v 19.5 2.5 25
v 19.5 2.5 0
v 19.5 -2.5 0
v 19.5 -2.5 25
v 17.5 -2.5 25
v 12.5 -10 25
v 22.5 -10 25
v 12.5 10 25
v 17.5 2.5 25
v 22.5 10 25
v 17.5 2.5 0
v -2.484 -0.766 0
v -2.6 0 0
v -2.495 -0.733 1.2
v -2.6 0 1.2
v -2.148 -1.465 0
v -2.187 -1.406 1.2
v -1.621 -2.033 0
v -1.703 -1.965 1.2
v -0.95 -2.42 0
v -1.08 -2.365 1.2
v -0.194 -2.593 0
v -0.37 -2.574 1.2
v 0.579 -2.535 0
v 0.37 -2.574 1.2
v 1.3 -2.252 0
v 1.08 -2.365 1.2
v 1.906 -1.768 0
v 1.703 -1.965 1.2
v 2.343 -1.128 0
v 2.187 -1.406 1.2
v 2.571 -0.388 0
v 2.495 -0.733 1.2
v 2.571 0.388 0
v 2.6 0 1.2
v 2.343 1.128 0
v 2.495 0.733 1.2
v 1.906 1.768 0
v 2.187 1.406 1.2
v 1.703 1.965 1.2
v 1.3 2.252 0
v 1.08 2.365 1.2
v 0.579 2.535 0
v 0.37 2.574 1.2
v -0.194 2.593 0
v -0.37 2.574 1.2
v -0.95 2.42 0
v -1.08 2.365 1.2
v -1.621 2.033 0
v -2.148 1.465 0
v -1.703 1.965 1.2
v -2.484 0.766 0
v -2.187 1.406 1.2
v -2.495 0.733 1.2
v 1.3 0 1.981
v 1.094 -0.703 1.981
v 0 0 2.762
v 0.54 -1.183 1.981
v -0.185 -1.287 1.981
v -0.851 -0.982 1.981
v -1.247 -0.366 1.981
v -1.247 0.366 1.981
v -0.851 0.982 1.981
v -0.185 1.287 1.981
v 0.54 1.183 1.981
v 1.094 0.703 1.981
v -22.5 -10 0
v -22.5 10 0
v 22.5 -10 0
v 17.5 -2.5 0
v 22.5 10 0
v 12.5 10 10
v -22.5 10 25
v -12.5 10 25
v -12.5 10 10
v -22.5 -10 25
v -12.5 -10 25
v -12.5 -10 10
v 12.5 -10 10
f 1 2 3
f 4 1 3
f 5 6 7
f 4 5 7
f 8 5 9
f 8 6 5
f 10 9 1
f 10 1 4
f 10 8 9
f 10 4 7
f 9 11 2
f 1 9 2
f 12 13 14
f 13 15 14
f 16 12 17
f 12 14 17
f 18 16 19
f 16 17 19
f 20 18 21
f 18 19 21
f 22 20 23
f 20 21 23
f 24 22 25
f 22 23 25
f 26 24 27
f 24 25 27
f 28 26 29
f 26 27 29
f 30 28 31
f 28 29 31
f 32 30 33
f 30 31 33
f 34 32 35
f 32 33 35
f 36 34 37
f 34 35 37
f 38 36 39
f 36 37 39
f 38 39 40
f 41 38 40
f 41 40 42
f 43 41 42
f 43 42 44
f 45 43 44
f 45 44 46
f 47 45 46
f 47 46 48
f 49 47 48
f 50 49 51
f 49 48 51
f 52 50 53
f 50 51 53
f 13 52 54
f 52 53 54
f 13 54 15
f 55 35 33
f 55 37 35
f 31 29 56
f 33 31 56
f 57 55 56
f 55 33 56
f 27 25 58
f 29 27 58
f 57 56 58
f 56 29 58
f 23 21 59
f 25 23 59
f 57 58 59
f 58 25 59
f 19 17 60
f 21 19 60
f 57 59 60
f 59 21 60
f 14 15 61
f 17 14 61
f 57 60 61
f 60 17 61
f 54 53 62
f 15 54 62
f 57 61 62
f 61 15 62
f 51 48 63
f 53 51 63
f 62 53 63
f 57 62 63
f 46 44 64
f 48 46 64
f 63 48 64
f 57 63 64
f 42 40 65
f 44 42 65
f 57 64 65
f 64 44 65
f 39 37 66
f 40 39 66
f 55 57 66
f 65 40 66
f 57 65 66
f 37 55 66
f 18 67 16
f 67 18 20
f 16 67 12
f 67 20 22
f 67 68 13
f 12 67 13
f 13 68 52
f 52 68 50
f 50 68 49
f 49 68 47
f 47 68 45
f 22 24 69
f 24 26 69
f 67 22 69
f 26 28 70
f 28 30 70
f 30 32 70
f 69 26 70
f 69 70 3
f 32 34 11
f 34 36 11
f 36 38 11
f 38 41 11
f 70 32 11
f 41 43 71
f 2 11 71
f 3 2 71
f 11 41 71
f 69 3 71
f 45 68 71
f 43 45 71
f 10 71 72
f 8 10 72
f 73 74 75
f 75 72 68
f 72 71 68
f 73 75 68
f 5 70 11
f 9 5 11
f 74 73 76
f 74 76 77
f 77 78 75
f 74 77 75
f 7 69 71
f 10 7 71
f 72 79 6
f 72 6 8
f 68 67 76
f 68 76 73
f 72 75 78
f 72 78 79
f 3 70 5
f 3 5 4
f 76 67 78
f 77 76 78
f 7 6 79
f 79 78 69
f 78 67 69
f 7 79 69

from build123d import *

# Parameters (mm, degrees)
F0_W     = 25
F0_H     = 20
F0_W_2   = 10
F1_DEPTH = 10
F2_DEPTH = 25
F4_D     = 5.2
F4_DEPTH = 1.2
F4_TIP   = 1.5622376095
F3_W     = 2
F3_H     = 2.5
F5_DEPTH = 36.07


with BuildPart() as f1:
    # F0 (on Top) → F1 (new body)
    with BuildSketch(Plane.XY):
        Rectangle(F0_W, F0_H)
        with Locations((-17.5, 0)):
            Rectangle(F0_W_2, F0_H)
        with Locations((17.5, 0)):
            Rectangle(F0_W_2, F0_H)
    extrude(amount=F1_DEPTH)

    # F0 (on Top) → F2 (join)
    with BuildSketch(Plane.XY):
        with Locations((-17.5, 0)):
            Rectangle(F0_W_2, F0_H)
        with Locations((17.5, 0)):
            Rectangle(F0_W_2, F0_H)
    extrude(amount=F2_DEPTH)

    # F4
    with Locations(Plane(origin=(0, 0, 0), x_dir=(1, 0, 0), z_dir=(0, 0, -1))):
        with Locations((0, 0)):
            Hole(F4_D / 2, depth=F4_DEPTH)
            with Locations((0, 0, -(F4_DEPTH + F4_TIP / 2))):  # 118° drill point
                Cone(0, F4_D / 2, F4_TIP, mode=Mode.SUBTRACT)

    # F3 (on face) → F5 (cut)
    with BuildSketch(Plane(origin=(0, 0, 0), x_dir=(1, 0, 0), z_dir=(0, 0, -1))):
        with Locations((18.5, 1.25)):
            Rectangle(F3_W, F3_H)
        with Locations((18.5, -1.25)):
            Rectangle(F3_W, F3_H)
    extrude(amount=-F5_DEPTH, mode=Mode.SUBTRACT)


solid = f1.part
